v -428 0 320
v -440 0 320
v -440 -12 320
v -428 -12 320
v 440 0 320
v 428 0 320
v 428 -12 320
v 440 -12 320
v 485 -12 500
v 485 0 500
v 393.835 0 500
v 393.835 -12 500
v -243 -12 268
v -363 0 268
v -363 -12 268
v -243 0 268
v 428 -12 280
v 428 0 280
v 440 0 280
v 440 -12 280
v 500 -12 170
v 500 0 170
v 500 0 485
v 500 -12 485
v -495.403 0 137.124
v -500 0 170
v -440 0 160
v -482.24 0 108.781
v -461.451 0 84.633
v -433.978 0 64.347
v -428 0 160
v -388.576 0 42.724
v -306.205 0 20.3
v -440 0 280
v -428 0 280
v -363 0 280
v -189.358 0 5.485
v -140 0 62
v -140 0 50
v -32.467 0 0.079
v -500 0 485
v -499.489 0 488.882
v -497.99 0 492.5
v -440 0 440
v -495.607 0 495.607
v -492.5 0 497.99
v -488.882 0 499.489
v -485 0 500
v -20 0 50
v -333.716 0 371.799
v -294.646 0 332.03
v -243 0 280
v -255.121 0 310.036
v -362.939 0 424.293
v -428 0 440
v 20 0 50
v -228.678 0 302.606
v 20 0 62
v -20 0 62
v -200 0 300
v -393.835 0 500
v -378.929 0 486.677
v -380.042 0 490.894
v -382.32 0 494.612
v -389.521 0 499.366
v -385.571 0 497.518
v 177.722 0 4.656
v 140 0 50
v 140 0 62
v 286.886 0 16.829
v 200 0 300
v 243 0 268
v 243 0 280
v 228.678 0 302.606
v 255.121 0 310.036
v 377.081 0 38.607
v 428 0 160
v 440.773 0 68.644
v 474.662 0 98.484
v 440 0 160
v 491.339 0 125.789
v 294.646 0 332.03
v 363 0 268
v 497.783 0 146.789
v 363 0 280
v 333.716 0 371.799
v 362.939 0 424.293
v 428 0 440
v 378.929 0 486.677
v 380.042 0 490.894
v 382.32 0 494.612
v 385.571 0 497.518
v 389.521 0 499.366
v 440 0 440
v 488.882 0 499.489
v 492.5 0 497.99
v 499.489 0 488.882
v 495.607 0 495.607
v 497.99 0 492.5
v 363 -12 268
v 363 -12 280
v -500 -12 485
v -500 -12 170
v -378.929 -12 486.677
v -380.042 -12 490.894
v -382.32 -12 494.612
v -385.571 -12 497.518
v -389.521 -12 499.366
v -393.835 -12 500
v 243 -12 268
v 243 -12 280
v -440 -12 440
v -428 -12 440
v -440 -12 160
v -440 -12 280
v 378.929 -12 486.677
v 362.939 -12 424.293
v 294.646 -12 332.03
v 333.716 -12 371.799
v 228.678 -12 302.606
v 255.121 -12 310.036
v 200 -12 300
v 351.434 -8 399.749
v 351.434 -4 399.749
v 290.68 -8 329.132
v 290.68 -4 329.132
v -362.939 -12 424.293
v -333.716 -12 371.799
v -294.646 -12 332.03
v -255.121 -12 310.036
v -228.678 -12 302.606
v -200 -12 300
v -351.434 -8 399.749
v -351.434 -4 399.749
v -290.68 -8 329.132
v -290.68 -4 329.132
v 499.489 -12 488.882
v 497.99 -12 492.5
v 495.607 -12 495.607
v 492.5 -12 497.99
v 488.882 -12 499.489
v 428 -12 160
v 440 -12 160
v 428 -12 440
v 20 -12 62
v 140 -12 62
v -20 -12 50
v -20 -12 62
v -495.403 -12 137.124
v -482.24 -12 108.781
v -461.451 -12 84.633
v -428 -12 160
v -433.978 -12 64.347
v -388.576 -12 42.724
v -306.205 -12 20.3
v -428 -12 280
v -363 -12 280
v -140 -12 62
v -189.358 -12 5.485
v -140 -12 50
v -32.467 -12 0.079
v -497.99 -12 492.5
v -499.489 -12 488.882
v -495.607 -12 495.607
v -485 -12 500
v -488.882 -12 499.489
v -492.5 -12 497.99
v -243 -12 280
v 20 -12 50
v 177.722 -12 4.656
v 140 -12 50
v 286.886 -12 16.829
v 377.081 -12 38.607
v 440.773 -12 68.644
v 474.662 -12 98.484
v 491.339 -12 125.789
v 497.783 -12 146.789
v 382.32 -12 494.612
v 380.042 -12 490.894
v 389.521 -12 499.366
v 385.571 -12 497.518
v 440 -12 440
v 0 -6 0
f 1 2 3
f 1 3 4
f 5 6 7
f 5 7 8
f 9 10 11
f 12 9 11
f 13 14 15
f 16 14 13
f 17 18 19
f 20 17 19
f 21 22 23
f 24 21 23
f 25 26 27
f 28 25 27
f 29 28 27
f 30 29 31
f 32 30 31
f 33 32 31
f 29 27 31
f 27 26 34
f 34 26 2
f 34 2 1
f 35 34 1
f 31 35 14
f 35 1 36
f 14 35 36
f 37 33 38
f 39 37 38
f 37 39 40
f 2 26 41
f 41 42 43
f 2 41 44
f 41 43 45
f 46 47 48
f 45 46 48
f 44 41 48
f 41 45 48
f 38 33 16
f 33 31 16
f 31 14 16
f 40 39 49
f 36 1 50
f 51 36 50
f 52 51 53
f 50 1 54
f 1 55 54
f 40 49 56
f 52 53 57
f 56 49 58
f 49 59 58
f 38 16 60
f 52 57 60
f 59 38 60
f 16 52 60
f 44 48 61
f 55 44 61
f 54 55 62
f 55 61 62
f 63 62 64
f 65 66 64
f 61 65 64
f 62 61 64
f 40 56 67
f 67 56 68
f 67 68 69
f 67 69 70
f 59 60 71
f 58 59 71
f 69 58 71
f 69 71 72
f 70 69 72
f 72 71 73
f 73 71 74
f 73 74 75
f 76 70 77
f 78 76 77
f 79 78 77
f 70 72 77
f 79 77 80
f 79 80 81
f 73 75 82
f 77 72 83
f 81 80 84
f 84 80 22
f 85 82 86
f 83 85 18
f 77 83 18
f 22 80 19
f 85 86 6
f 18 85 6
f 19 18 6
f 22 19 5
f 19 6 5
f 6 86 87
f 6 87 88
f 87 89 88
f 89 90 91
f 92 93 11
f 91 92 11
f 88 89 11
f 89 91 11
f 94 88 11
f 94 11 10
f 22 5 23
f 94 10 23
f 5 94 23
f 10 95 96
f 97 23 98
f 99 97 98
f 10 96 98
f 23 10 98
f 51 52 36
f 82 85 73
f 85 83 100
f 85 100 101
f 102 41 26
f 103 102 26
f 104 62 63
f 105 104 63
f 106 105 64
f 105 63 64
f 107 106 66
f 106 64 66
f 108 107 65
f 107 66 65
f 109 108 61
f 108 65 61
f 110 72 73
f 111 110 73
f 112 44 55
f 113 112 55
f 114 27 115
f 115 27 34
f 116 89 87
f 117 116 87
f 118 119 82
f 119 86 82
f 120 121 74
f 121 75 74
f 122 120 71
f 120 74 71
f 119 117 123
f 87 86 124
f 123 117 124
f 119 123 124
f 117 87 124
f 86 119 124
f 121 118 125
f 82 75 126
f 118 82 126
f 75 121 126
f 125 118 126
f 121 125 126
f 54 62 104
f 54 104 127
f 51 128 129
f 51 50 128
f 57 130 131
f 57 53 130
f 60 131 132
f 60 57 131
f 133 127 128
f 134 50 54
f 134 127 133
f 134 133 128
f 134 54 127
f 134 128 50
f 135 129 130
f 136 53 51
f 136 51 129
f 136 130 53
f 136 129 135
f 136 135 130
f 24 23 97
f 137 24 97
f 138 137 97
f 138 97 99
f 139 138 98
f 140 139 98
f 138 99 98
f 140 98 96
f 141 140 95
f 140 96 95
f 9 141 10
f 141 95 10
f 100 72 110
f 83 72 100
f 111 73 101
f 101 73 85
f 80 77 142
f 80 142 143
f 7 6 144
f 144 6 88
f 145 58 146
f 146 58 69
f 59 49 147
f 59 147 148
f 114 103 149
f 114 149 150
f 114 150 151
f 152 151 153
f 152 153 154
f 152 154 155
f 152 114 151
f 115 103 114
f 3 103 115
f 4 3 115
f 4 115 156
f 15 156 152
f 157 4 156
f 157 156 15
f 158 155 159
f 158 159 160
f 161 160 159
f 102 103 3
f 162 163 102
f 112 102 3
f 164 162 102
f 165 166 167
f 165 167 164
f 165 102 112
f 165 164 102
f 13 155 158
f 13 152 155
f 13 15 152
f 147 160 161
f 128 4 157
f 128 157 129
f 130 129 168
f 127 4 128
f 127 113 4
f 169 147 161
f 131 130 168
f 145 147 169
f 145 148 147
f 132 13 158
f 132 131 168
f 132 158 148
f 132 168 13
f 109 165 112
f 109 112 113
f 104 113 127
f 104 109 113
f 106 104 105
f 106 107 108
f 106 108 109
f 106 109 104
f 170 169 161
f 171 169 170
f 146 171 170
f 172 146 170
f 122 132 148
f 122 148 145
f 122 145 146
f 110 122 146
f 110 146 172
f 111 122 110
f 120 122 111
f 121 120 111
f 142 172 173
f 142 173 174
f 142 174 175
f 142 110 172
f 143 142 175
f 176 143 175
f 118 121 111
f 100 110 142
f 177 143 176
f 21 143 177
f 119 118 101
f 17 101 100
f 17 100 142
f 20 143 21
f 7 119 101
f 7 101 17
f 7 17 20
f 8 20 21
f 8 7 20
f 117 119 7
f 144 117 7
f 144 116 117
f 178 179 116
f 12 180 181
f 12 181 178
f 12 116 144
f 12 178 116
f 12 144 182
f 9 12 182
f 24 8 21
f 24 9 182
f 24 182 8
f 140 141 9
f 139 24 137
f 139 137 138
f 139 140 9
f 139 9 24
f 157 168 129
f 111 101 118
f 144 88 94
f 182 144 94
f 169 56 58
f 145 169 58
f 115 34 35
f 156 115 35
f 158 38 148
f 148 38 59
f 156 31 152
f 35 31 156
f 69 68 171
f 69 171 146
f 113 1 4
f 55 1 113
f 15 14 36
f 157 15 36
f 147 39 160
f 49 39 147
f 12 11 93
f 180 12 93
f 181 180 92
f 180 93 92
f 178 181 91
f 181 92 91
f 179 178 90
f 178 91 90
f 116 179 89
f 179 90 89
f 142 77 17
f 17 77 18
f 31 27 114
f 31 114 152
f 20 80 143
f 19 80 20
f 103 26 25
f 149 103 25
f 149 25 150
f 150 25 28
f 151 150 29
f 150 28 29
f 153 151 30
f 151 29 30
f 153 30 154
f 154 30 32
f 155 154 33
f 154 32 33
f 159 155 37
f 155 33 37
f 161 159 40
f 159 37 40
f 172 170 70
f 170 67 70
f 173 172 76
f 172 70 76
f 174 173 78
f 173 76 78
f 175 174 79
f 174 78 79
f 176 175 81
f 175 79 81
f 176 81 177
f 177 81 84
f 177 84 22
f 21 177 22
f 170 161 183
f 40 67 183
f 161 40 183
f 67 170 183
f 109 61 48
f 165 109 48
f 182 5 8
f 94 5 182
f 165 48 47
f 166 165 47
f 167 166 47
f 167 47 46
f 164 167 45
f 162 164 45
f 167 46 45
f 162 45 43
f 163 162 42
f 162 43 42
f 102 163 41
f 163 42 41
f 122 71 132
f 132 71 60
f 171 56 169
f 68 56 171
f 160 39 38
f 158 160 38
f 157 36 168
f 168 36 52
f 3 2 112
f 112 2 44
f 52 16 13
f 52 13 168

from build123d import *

# Parameters (mm, degrees)
F0_W     = 120
F0_H     = 12
F0_W_2   = 12
F0_H_2   = 120
F1_DEPTH = 12


with BuildPart() as f1:
    # F0 (on Front) → F1 (new body)
    with BuildSketch(Plane.XZ):
        with BuildLine():
            ThreePointArc((-378.929395, 486.677106), (-383.83926, 496.183841), (-393.835344, 500))
            Line((-393.835344, 500), (-485, 500))
            ThreePointArc((-485, 500), (-495.606602, 495.606602), (-500, 485))
            Line((-500, 485), (-500, 170))
            add(Edge.make_bspline(
                [(-500, 170), (-500, 5.885842), (-190.944657, 0), (0, 0)],
                knots=[0, 0, 0, 0, 528.109837, 528.109837, 528.109837, 528.109837], degree=3))
            add(Edge.make_bspline(
                [(500, 170), (500, 5.885842), (190.944657, 0), (0, 0)],
                knots=[0, 0, 0, 0, 528.109837, 528.109837, 528.109837, 528.109837], degree=3))
            Line((500, 170), (500, 485))
            ThreePointArc((500, 485), (495.606602, 495.606602), (485, 500))
            Line((485, 500), (393.835344, 500))
            ThreePointArc((393.835344, 500), (383.83926, 496.183841), (378.929395, 486.677106))
            add(Edge.make_bspline(
                [(378.929395, 486.677106), (369.175225, 399.983037), (304.53169, 300), (200, 300)],
                knots=[13.22611, 13.22611, 13.22611, 13.22611, 269.072481, 269.072481, 269.072481, 269.072481], degree=3))
            Line((200, 300), (0, 300))
            Line((0, 300), (-200, 300))
            add(Edge.make_bspline(
                [(-378.929395, 486.677106), (-369.175225, 399.983037), (-304.53169, 300), (-200, 300)],
                knots=[13.22611, 13.22611, 13.22611, 13.22611, 269.072481, 269.072481, 269.072481, 269.072481], degree=3))
        make_face()
        with Locations((-80, 56)):
            Rectangle(F0_W, F0_H, mode=Mode.SUBTRACT)
        with Locations((-434, 220)):
            Rectangle(F0_W_2, F0_H_2, mode=Mode.SUBTRACT)
        with Locations((80, 56)):
            Rectangle(F0_W, F0_H, mode=Mode.SUBTRACT)
        with Locations((434, 220)):
            Rectangle(F0_W_2, F0_H_2, mode=Mode.SUBTRACT)
        with Locations((-303, 274)):
            Rectangle(F0_W, F0_H, mode=Mode.SUBTRACT)
        with Locations((-434, 380)):
            Rectangle(F0_W_2, F0_H_2, mode=Mode.SUBTRACT)
        with Locations((303, 274)):
            Rectangle(F0_W, F0_H, mode=Mode.SUBTRACT)
        with Locations((434, 380)):
            Rectangle(F0_W_2, F0_H_2, mode=Mode.SUBTRACT)
    extrude(amount=F1_DEPTH)


solid = f1.part
